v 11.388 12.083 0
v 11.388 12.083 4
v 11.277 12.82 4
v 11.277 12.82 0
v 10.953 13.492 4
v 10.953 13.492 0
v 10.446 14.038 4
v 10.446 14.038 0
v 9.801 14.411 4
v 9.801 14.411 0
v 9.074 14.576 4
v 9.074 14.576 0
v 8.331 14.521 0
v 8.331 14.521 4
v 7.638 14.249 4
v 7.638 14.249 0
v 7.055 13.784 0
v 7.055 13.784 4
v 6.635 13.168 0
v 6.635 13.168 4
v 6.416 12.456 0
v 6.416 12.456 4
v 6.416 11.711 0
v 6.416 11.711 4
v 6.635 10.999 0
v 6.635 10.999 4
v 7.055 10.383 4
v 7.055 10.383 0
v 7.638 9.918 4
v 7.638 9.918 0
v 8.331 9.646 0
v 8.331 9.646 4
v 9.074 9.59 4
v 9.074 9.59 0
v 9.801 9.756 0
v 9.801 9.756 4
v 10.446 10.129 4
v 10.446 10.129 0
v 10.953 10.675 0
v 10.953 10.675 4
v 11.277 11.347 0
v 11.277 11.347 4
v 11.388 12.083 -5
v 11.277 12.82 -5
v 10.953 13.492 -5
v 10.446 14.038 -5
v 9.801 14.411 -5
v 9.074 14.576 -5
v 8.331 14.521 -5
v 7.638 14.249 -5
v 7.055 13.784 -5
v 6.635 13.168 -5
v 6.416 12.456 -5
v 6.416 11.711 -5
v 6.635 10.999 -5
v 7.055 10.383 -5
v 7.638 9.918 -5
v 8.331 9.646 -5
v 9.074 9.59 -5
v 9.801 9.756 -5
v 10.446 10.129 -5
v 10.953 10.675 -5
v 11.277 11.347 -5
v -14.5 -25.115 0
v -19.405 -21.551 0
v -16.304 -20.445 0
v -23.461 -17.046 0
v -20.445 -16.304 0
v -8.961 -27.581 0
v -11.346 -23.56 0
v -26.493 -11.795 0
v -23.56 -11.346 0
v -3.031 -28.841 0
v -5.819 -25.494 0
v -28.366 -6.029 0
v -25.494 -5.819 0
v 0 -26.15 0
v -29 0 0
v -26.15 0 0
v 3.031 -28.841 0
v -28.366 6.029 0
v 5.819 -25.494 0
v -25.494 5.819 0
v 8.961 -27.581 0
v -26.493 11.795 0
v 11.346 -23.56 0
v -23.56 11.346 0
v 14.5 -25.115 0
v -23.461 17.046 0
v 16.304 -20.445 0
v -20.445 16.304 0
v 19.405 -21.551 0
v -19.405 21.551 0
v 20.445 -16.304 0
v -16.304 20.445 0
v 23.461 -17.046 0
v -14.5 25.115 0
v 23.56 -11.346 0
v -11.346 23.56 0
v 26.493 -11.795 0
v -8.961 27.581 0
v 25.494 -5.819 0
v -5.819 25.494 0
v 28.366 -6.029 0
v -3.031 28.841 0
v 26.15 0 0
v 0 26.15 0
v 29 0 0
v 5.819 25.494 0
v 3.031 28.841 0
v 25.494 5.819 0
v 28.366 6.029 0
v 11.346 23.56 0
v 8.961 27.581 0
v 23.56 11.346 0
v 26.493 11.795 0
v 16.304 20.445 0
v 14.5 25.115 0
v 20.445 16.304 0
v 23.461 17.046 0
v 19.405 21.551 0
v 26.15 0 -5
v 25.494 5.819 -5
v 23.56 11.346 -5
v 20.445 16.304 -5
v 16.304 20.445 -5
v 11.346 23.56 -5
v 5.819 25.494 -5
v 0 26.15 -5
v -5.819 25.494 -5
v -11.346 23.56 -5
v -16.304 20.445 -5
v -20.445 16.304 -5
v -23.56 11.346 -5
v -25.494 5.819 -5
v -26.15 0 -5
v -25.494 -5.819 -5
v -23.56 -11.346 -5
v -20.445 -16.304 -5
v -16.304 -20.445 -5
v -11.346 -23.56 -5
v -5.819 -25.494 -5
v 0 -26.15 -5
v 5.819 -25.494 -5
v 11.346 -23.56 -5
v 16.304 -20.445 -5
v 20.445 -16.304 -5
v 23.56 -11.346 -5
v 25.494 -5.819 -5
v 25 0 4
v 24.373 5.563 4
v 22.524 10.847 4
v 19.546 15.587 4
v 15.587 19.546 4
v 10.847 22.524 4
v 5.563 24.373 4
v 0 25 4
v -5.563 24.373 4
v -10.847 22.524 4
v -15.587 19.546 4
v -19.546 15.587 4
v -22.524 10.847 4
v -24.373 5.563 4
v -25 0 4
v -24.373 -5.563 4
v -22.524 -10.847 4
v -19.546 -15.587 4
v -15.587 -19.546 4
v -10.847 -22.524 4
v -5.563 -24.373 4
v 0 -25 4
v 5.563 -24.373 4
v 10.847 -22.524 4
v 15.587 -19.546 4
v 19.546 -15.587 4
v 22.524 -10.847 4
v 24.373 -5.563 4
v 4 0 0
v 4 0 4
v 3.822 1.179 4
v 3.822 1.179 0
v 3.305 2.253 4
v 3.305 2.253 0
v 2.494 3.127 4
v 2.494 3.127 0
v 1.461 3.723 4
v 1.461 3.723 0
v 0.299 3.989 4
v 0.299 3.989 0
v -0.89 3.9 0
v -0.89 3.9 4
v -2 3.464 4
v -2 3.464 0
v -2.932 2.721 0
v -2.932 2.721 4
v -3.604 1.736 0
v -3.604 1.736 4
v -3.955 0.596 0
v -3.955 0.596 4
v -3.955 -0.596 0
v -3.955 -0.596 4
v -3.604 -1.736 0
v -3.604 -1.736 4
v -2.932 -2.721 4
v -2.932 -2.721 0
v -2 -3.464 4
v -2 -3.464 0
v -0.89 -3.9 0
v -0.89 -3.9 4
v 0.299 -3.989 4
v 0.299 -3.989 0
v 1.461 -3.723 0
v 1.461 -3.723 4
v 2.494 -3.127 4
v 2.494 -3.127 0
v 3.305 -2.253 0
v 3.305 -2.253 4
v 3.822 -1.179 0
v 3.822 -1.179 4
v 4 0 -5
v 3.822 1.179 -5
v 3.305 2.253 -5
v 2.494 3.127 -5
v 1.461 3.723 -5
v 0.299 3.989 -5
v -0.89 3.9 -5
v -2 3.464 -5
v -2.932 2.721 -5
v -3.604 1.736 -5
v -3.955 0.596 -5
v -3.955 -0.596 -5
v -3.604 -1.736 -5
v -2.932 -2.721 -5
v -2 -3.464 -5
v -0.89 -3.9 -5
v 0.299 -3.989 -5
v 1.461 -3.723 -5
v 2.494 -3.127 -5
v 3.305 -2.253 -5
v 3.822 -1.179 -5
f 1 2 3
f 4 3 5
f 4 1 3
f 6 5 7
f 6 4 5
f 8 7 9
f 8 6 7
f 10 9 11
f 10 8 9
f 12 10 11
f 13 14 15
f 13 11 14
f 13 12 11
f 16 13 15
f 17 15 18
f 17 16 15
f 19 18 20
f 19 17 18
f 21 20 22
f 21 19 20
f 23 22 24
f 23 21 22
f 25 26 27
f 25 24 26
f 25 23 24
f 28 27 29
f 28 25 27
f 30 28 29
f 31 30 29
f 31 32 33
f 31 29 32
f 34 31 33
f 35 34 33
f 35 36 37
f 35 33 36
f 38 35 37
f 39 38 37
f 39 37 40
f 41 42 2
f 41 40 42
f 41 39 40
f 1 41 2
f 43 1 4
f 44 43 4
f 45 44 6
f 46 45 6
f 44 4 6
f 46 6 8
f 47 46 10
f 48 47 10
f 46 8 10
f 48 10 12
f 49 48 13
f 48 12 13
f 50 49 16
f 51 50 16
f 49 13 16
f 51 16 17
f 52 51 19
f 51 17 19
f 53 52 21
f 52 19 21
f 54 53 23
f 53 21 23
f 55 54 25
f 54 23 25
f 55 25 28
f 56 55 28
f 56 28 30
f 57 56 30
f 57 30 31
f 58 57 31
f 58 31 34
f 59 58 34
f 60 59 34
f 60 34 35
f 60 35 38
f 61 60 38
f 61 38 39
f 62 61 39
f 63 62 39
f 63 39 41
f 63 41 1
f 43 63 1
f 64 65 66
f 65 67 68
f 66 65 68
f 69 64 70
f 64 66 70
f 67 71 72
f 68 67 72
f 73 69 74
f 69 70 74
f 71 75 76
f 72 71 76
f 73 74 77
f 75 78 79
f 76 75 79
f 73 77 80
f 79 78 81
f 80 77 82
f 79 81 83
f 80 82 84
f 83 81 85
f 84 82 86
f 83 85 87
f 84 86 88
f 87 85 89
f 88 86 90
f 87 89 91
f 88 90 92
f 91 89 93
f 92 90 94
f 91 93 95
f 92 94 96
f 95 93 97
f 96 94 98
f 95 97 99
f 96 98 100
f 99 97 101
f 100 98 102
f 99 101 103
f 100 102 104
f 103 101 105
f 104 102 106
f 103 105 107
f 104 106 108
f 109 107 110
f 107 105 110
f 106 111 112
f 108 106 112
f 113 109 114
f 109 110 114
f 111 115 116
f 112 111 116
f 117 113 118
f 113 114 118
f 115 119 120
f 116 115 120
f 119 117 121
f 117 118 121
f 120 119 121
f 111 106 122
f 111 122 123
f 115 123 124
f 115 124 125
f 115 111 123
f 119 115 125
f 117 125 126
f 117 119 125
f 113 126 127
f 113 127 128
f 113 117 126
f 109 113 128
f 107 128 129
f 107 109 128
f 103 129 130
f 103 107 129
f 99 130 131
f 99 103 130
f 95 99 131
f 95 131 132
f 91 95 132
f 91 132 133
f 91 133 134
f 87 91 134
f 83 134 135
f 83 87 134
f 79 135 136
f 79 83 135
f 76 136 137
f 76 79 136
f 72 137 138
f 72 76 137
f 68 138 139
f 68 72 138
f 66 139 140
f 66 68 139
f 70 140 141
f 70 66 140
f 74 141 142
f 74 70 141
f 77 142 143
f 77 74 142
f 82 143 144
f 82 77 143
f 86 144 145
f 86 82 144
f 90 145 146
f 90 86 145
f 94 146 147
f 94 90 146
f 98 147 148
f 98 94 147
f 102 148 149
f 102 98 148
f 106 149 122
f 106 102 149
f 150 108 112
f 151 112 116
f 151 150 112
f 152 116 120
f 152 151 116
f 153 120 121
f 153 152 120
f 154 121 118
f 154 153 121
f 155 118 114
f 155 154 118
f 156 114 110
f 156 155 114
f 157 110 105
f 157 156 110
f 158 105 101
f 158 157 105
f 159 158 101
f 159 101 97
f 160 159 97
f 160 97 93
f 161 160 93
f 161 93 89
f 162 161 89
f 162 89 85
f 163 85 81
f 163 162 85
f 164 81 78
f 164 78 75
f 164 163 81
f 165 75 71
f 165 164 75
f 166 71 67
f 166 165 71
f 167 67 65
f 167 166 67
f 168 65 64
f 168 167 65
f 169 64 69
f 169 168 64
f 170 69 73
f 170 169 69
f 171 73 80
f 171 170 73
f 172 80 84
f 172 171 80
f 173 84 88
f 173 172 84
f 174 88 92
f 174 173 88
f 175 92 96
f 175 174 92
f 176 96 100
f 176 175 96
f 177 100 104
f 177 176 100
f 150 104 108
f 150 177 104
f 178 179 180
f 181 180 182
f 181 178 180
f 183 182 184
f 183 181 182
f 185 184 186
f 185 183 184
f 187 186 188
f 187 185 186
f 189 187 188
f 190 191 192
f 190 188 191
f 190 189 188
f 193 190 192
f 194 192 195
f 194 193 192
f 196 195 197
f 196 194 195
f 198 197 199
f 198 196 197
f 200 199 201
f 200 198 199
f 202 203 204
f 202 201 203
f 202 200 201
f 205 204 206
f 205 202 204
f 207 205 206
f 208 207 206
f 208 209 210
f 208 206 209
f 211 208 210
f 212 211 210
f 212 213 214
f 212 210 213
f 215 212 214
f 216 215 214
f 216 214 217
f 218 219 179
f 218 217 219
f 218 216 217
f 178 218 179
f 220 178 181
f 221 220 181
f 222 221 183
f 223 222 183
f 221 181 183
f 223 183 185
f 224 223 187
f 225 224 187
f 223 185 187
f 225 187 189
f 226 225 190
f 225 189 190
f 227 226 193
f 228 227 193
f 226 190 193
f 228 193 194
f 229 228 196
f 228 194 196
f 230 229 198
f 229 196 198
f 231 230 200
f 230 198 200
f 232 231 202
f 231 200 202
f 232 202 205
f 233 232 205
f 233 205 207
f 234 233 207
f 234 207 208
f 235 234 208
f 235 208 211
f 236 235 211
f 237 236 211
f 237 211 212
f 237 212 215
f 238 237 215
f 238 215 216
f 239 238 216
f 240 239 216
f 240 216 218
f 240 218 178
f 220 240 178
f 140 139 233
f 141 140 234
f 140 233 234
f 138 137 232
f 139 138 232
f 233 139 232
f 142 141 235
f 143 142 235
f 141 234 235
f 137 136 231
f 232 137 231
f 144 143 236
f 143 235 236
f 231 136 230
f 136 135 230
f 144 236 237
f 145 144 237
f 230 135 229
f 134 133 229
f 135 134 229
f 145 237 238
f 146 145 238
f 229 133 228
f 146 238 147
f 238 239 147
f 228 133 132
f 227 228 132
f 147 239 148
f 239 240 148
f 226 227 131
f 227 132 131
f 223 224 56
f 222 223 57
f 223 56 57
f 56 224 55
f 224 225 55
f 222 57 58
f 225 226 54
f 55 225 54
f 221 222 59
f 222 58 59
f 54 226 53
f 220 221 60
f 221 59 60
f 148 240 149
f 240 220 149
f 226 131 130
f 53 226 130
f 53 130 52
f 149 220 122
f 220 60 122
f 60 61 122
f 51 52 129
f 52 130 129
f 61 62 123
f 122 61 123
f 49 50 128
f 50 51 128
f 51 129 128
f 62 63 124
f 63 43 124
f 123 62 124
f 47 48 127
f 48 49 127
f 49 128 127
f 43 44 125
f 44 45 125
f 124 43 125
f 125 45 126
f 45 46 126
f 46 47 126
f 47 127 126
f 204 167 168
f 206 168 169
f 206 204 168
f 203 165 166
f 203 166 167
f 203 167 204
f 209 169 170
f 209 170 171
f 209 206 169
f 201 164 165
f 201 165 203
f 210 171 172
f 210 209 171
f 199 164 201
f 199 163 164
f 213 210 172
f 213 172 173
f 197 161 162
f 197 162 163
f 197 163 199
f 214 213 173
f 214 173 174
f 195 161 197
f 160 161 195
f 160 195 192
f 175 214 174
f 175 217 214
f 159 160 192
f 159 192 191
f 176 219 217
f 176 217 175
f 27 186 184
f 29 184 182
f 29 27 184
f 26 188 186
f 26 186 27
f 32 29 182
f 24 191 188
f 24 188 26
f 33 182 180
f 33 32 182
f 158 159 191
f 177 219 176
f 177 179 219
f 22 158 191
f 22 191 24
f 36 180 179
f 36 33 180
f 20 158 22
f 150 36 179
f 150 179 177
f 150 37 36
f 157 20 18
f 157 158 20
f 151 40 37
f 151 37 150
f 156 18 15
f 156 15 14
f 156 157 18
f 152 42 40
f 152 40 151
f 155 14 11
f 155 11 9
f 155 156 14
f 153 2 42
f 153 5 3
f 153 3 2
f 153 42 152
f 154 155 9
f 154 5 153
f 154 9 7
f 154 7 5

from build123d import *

# Parameters (mm, degrees)
F0_R          = 29
F1_DEPTH      = 4
F2_R          = 26.15
F3_DEPTH      = 5
F4_SIZE       = 3.99999
F5_R          = 4
F6_DEPTH      = 25
F6_DEPTH_BACK = 25
F7_R          = 2.5
F8_DEPTH      = 25
F8_DEPTH_BACK = 25


# Not quite as in the source:
# - a fillet or chamfer is up to 0.001 mm smaller than in the source, because OpenCascade refuses the exact size


with BuildPart() as f1:
    # F0 (on Top) → F1 (new body)
    with BuildSketch(Plane.XY):
        Circle(F0_R)
    extrude(amount=F1_DEPTH)

    # F2 (on Top) → F3 (join)
    with BuildSketch(Plane.XY):
        Circle(F2_R)
    extrude(amount=-F3_DEPTH)

    # F4 (size 4 in the source; OpenCascade refuses exactly that, so slightly less here)
    f4_edges = [f1.edges().sort_by_distance(p)[0] for p in [
        (-29, 0, 4),
    ]]
    chamfer(f4_edges, length=F4_SIZE)

    # F5 (on Top) → F6 (cut, two sides)
    with BuildSketch(Plane.XY) as f6_sk:
        Circle(F5_R)
    extrude(amount=F6_DEPTH, mode=Mode.SUBTRACT)
    extrude(f6_sk.sketch, amount=-F6_DEPTH_BACK, mode=Mode.SUBTRACT)

    # F7 (on Top) → F8 (cut, two sides)
    with BuildSketch(Plane.XY) as f8_sk:
        with Locations((8.8876162109, 12.0834712764)):
            Circle(F7_R)
    extrude(amount=F8_DEPTH, mode=Mode.SUBTRACT)
    extrude(f8_sk.sketch, amount=-F8_DEPTH_BACK, mode=Mode.SUBTRACT)


solid = f1.part
